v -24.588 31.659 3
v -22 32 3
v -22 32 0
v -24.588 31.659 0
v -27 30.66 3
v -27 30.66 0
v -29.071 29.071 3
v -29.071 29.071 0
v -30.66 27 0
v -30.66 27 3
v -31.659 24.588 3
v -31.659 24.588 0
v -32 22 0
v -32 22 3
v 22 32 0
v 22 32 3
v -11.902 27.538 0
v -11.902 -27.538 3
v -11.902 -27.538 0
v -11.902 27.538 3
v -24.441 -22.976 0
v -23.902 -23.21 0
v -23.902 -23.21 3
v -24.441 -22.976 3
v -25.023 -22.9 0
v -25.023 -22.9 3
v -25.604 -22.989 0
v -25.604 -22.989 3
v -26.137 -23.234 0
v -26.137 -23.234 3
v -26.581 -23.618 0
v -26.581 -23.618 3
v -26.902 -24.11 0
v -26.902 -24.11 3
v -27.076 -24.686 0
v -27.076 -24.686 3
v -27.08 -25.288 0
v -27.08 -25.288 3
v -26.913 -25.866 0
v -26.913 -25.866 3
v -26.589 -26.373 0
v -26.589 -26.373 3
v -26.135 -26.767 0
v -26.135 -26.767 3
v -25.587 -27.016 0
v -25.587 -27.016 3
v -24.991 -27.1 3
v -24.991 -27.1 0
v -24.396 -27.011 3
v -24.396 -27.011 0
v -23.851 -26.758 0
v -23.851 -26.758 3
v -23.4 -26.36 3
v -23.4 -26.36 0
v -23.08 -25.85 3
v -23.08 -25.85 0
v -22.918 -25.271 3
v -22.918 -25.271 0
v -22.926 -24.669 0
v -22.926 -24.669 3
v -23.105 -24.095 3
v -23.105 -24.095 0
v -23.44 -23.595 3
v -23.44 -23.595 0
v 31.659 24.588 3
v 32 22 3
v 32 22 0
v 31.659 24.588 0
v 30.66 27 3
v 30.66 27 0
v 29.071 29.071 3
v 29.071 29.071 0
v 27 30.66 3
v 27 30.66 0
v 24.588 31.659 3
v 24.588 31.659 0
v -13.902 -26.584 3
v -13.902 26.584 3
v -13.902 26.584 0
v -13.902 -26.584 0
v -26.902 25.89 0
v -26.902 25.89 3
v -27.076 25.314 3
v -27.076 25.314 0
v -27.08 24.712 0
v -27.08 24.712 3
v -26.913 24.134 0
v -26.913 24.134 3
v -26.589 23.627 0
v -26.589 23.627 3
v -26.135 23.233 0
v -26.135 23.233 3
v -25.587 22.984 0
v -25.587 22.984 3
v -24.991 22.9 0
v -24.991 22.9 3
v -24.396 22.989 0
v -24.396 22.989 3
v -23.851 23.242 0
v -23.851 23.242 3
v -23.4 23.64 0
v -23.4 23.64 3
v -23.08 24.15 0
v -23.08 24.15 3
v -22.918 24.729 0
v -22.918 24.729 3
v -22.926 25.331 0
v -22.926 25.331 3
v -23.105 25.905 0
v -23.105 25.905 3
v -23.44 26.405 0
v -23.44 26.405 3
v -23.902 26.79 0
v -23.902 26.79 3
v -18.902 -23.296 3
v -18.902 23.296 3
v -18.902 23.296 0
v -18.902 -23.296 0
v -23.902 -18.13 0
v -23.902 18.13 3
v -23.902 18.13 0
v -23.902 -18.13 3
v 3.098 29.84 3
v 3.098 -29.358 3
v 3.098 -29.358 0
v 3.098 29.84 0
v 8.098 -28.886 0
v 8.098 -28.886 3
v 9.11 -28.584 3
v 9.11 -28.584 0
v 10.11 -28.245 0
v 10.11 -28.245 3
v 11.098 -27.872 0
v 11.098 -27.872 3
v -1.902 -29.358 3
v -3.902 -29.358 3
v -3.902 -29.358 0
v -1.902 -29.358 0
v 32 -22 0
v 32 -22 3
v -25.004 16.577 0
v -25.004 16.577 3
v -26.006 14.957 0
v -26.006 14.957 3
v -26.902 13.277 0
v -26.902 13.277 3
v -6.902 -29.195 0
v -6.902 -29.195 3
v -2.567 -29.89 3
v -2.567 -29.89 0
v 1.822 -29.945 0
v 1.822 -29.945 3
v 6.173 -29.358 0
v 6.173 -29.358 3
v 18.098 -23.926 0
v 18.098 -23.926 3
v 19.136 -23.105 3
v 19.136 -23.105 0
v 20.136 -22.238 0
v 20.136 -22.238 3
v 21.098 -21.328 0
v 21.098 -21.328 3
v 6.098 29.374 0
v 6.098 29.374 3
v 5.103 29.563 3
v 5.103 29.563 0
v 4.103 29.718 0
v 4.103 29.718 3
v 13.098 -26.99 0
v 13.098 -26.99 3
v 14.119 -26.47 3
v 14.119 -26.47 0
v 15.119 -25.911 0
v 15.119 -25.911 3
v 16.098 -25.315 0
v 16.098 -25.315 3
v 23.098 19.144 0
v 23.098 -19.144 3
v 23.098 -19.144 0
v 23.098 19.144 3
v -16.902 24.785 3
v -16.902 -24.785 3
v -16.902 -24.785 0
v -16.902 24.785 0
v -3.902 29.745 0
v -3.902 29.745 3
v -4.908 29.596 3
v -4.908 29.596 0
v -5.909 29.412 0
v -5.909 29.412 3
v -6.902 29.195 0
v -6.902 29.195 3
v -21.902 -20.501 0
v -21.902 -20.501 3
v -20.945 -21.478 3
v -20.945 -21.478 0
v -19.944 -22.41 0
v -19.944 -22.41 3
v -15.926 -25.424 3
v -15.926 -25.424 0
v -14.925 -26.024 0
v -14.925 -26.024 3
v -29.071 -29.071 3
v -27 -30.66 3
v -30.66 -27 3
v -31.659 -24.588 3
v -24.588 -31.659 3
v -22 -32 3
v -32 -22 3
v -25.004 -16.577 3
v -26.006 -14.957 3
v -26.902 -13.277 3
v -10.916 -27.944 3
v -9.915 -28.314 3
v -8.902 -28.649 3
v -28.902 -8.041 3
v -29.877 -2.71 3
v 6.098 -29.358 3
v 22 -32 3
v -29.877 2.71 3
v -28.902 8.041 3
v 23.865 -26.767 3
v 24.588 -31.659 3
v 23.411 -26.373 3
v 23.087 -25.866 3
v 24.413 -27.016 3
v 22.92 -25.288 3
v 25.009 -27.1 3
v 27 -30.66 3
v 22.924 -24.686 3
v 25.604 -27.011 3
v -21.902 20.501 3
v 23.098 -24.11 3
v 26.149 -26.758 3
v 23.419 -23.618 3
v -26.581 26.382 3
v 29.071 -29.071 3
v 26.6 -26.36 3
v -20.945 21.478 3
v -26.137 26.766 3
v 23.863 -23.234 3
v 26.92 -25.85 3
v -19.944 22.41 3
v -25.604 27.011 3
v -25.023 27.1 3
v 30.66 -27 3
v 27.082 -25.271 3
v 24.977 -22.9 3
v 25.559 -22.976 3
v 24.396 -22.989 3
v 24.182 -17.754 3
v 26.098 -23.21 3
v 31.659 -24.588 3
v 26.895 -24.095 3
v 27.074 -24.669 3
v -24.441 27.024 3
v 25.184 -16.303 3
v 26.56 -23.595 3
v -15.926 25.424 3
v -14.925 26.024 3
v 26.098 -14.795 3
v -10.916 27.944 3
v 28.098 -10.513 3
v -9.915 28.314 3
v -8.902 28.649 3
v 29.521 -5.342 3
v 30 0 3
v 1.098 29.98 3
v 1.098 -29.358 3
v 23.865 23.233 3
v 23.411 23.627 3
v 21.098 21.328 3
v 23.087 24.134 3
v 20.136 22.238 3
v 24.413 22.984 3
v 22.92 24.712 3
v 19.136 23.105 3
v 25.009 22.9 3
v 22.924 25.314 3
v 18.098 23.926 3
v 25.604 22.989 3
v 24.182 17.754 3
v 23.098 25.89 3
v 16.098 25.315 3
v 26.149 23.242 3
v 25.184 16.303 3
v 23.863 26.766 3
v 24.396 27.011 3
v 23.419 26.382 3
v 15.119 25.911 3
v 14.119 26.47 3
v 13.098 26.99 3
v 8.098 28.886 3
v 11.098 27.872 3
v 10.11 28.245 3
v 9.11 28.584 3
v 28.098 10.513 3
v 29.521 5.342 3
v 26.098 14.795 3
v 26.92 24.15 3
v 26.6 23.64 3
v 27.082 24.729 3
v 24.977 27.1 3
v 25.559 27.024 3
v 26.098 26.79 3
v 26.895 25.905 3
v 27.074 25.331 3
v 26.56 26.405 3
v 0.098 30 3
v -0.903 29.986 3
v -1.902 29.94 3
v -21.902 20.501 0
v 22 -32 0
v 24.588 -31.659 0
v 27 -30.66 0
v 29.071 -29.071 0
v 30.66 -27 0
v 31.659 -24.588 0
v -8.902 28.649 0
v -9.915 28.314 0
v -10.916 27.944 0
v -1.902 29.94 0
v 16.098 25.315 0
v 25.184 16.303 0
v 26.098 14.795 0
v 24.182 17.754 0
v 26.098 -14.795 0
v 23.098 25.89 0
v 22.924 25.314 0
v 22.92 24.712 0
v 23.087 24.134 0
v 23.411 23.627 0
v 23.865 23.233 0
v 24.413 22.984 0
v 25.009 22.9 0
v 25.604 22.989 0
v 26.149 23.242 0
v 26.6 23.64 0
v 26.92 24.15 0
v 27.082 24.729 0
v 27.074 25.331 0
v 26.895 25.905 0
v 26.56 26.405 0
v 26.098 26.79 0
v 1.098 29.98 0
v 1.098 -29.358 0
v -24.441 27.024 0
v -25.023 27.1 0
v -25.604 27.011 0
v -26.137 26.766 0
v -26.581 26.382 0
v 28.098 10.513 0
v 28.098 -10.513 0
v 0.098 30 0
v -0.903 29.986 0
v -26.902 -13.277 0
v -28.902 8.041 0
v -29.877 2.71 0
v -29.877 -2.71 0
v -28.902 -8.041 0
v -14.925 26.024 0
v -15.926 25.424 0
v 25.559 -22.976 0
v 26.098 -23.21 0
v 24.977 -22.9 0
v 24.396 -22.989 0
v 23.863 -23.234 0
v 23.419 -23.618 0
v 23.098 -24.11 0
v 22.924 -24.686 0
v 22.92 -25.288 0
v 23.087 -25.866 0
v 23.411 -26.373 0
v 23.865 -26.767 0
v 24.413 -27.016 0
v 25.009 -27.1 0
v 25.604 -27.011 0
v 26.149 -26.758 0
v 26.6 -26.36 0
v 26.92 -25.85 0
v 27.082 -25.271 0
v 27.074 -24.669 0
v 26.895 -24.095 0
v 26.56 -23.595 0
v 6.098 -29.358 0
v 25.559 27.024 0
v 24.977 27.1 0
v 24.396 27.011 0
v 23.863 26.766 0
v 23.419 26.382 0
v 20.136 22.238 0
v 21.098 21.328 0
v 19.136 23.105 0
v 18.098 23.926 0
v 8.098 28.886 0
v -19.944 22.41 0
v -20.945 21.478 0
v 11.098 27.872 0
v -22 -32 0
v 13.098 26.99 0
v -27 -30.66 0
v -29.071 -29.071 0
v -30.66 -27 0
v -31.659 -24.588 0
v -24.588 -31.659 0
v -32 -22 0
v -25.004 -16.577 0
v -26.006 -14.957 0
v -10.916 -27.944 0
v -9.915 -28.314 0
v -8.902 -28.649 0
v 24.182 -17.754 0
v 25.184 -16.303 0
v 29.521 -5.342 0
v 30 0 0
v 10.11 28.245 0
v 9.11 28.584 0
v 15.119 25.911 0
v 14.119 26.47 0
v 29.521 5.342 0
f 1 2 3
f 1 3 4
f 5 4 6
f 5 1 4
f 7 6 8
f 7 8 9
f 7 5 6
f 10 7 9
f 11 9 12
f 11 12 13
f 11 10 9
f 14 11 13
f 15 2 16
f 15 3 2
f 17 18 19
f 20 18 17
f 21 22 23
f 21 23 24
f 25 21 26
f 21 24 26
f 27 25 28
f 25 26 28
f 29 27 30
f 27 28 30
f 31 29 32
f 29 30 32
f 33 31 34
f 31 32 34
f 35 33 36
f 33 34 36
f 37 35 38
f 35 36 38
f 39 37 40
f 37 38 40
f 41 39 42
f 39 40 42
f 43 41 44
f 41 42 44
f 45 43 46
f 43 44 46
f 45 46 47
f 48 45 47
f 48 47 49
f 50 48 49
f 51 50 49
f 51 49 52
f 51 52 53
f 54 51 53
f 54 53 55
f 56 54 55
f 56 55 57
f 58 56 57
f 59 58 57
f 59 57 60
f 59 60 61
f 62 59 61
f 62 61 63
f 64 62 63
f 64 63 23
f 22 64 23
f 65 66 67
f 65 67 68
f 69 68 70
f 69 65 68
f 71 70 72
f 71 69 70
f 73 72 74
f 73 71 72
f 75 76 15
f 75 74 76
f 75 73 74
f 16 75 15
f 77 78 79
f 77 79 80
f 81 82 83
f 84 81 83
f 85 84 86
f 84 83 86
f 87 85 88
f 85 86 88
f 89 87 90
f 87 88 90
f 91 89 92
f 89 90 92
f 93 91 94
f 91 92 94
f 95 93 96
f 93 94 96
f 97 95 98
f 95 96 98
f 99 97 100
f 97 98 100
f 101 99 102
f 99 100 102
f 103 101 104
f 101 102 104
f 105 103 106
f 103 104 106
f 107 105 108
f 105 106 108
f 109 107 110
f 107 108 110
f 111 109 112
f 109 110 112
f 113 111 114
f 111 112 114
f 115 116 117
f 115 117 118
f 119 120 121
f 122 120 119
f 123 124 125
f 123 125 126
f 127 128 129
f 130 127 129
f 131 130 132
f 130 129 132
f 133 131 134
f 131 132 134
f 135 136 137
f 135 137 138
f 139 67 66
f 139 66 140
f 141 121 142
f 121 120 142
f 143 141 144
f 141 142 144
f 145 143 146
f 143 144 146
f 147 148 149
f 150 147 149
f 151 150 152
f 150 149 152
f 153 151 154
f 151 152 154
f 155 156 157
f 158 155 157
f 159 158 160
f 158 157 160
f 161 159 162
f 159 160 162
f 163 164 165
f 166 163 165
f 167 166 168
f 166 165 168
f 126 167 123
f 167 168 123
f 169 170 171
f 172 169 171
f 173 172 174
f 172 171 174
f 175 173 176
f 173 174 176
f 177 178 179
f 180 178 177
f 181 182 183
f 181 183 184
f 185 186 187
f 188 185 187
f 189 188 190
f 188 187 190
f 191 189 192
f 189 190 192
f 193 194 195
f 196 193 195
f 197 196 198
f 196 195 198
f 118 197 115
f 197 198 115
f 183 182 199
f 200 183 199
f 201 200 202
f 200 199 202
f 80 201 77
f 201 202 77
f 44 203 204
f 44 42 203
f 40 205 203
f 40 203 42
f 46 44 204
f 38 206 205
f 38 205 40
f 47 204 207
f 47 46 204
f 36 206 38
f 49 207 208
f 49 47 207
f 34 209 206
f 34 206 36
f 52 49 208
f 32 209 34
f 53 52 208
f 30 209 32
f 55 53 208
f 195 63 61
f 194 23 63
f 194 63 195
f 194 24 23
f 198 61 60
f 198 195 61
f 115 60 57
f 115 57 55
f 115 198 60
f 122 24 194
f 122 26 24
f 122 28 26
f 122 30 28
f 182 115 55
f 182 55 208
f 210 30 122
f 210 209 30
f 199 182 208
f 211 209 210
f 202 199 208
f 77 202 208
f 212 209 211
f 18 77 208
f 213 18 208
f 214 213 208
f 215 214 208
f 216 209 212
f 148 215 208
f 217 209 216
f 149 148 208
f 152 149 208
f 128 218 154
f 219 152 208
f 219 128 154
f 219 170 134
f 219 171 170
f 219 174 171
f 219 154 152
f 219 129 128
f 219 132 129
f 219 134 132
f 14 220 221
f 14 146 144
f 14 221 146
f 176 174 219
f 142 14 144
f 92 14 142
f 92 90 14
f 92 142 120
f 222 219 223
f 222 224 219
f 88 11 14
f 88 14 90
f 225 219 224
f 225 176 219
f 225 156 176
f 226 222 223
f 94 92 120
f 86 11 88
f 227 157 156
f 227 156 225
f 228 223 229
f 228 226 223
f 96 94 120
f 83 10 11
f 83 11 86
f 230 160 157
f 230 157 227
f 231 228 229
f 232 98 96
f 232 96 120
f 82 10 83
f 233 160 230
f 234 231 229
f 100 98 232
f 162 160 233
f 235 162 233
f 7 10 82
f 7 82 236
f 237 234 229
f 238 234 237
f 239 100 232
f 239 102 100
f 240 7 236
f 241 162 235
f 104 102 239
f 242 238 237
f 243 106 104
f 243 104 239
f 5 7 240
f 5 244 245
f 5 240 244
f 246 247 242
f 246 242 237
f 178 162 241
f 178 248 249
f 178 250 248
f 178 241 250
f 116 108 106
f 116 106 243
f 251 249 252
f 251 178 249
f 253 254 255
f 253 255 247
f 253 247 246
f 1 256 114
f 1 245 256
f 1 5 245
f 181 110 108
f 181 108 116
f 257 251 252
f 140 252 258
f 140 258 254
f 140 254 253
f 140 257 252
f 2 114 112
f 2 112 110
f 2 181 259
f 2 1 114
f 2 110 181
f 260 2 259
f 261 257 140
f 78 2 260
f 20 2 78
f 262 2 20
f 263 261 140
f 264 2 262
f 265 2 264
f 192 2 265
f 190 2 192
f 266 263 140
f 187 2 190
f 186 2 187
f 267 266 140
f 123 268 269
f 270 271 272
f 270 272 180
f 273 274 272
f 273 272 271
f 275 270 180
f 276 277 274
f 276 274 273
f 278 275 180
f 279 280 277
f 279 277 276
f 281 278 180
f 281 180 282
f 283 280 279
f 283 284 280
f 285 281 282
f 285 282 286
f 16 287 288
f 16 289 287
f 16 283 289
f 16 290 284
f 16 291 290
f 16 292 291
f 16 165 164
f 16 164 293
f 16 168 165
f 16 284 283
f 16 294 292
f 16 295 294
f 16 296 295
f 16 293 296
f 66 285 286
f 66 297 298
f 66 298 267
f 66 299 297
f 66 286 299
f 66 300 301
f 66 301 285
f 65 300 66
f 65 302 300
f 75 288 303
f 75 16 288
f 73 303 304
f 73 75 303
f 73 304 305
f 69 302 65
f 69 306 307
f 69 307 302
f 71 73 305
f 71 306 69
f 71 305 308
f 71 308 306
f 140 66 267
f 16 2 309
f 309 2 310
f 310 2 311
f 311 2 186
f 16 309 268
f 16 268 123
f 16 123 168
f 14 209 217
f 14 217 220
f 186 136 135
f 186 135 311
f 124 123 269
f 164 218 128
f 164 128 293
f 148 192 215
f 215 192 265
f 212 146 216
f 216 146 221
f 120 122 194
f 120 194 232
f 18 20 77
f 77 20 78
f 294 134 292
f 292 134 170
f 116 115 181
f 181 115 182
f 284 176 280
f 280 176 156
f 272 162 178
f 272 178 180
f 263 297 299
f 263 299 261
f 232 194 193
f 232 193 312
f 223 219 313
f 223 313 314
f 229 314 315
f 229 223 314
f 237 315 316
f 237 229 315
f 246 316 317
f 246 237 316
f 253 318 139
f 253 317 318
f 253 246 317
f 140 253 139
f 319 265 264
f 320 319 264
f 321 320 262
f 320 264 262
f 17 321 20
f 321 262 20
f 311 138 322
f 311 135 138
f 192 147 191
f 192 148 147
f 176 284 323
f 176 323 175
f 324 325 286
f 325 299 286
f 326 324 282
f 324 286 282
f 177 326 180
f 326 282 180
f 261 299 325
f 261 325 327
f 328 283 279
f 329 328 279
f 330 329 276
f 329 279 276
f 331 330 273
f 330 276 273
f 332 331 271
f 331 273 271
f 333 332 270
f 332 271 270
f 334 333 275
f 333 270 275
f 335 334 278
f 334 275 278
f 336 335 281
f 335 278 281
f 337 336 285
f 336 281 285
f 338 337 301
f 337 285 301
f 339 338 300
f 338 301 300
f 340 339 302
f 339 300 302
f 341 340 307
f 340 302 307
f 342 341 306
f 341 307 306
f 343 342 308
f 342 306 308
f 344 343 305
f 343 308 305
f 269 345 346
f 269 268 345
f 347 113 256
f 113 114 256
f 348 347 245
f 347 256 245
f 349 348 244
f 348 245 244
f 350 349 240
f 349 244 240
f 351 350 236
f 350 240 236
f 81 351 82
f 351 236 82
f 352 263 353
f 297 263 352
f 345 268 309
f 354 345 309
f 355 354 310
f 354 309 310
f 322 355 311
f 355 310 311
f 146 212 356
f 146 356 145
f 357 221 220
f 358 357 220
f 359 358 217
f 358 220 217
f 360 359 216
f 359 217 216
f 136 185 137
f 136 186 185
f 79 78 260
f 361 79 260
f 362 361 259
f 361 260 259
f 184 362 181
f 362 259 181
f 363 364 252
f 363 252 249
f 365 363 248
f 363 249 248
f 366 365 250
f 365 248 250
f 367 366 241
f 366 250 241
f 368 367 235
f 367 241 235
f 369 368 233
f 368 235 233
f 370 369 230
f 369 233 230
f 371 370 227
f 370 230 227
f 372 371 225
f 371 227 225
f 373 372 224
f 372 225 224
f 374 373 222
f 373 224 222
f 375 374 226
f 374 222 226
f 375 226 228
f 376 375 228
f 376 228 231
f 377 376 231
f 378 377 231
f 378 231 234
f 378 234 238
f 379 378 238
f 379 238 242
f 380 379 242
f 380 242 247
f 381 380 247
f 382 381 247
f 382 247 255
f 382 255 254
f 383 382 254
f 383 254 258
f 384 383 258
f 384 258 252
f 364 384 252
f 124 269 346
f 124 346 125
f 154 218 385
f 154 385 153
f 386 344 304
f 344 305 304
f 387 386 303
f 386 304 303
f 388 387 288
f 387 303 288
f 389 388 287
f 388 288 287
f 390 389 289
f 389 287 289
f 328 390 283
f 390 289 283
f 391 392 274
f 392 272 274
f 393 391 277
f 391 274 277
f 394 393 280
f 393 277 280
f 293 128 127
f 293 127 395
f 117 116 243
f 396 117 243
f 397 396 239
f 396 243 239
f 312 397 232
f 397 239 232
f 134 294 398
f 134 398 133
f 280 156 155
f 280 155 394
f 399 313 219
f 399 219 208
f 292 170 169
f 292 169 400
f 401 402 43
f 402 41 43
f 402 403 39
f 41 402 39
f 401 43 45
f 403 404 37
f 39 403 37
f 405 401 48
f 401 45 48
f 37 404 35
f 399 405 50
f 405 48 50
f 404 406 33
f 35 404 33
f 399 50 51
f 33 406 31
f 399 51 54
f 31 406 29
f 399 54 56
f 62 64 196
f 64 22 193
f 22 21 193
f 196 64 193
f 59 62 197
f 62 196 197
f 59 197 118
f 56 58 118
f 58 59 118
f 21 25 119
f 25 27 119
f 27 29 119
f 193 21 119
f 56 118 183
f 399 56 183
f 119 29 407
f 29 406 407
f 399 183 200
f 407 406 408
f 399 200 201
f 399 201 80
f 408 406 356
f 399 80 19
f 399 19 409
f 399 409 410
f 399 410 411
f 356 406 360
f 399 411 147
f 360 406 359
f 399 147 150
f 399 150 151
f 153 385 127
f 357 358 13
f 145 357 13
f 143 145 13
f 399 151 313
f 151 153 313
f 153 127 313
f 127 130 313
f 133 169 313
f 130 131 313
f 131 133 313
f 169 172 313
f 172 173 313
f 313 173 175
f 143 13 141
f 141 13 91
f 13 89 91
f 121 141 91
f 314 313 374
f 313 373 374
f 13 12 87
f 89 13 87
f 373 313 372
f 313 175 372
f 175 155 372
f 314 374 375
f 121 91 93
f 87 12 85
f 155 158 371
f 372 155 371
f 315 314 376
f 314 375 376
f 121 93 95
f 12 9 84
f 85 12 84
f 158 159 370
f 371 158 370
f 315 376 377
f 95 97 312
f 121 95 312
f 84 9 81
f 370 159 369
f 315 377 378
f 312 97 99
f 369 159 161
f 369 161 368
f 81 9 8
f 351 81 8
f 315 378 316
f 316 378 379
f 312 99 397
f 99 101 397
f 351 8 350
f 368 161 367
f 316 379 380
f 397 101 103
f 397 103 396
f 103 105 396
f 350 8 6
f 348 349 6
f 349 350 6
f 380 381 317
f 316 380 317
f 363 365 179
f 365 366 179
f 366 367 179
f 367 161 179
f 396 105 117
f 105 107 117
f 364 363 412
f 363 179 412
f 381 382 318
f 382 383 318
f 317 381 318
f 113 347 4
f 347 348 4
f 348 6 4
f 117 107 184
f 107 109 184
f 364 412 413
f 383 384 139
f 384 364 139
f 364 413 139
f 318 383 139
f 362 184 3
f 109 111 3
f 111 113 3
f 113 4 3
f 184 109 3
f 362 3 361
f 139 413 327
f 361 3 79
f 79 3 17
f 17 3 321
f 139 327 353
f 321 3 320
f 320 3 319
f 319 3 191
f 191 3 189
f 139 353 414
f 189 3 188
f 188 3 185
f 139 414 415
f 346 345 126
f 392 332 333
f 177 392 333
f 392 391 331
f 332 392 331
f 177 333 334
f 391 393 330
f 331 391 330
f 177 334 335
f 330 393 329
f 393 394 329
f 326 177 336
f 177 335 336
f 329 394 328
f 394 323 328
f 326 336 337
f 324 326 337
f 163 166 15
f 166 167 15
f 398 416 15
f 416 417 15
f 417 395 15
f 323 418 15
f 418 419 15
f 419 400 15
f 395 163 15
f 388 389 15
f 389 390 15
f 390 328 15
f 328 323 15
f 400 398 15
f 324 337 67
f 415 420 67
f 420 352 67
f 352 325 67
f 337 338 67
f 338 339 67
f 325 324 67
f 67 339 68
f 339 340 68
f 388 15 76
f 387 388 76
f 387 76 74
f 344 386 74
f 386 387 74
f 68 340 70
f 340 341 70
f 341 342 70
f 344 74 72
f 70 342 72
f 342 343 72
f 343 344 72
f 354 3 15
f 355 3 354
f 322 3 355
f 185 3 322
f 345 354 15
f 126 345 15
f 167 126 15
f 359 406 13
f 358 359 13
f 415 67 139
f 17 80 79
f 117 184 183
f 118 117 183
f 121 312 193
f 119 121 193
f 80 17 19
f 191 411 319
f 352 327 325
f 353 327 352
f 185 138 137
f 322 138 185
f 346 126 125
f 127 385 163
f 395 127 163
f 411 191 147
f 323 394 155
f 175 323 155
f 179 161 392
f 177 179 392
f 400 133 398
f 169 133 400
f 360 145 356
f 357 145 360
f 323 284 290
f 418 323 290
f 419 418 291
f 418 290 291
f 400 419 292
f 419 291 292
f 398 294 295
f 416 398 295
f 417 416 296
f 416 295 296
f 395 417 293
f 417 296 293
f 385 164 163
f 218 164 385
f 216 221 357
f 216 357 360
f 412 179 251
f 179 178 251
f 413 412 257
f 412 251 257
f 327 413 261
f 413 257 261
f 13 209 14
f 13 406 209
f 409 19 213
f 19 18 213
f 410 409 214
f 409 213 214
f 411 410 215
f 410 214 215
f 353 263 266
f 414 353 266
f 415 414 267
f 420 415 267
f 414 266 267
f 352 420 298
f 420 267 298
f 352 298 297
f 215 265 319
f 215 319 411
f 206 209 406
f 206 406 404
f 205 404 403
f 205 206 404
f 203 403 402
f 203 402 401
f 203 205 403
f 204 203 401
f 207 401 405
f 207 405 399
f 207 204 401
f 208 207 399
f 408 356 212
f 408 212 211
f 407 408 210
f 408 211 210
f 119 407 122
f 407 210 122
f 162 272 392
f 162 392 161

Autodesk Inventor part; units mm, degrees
ref_plane "YZ Plane" through (0, 0, 0) normal (1, 0, 0) x (0, 1, 0)
ref_plane "XZ Plane" through (0, 0, 0) normal (0, 1, 0) x (-1, 0, 0)
ref_plane "XY Plane" through (0, 0, 0) normal (0, 0, 1) x (1, 0, 0)
sketch "Skizze1" plane through (0, 0, 0) normal (0, 0, 1) x (1, 0, 0)
  line L0 (-41.5, 35.6804) -> (-41.5, -22.9) construction
  line L1 (-41.5, -22.9) -> (-43.9777, -22.9) construction
  line L2 (-43.9777, -22.9) -> (-43.9777, 35.6804) construction
  line L3 (-43.9777, 35.6804) -> (-41.5, 35.6804) construction
  line L4 (-47.5, 35.6804) -> (-47.5, -0.041) construction
  line L5 (-47.5, -0.041) -> (-49.9777, -0.041) construction
  line L6 (-49.9777, -0.041) -> (-49.9777, 35.6804) construction
  line L7 (-49.9777, 35.6804) -> (-47.5, 35.6804) construction
  circle A0 centre (-47.5, -3) radius 1.35 construction
  line L8 (36.5, 27.1) -> (36.5, -35.7623) construction
  line L9 (36.5, -35.7623) -> (34.0223, -35.7623) construction
  line L10 (34.0223, -35.7623) -> (34.0223, 27.1) construction
  line L11 (34.0223, 27.1) -> (36.5, 27.1) construction
  line L12 (30.5, -25.9706) -> (30.5, -35.7623) construction
  line L13 (30.5, -35.7623) -> (28.0223, -35.7623) construction
  line L14 (28.0223, -35.7623) -> (28.0223, -25.9706) construction
  line L15 (28.0223, -25.9706) -> (30.5, -25.9706) construction
  line L16 (18.5, -28.5) -> (18.5, -35.7623) construction
  line L17 (18.5, -35.7623) -> (16.0223, -35.7623) construction
  line L18 (16.0223, -35.7623) -> (16.0223, -28.5) construction
  line L19 (16.0223, -28.5) -> (18.5, -28.5) construction
  line L20 (-29.5, -16.7561) -> (-29.5, -22.9) construction
  line L21 (-29.5, -22.9) -> (-31.9777, -22.9) construction
  line L22 (-31.9777, -22.9) -> (-31.9777, -16.7561) construction
  line L23 (-31.9777, -16.7561) -> (-29.5, -16.7561) construction
  line L24 (-25.9777, 30.1243) -> (-25.9777, 35.6804) construction
  line L25 (-25.9777, 35.6804) -> (-23.5, 35.6804) construction
  line L26 (-23.5, 35.6804) -> (-23.5, 30.1243) construction
  line L27 (-23.5, 30.1243) -> (-25.9777, 30.1243) construction
  line L28 (16.0223, 31.6466) -> (16.0223, 35.6804) construction
  line L29 (16.0223, 35.6804) -> (18.5, 35.6804) construction
  line L30 (18.5, 35.6804) -> (18.5, 31.6466) construction
  line L31 (18.5, 31.6466) -> (16.0223, 31.6466) construction
  line L32 (-5.5, -32.1312) -> (-5.5, -35.7623) construction
  line L33 (-5.5, -35.7623) -> (-7.9777, -35.7623) construction
  line L34 (-7.9777, -35.7623) -> (-7.9777, -32.1312) construction
  line L35 (-7.9777, -32.1312) -> (-5.5, -32.1312) construction
  line L36 (10.0223, 32.8979) -> (10.0223, 35.6804) construction
  line L37 (10.0223, 35.6804) -> (12.5, 35.6804) construction
  line L38 (12.5, 35.6804) -> (12.5, 32.8979) construction
  line L39 (12.5, 32.8979) -> (10.0223, 32.8979) construction
  line L40 (-7.9777, 33.0955) -> (-7.9777, 35.6804) construction
  line L41 (-7.9777, 35.6804) -> (-5.5, 35.6804) construction
  line L42 (-5.5, 35.6804) -> (-5.5, 33.0955) construction
  line L43 (-5.5, 33.0955) -> (-7.9777, 33.0955) construction
  line L44 (0.5, -33.9467) -> (0.5, -35.7623) construction
  line L45 (0.5, -35.7623) -> (-1.9777, -35.7623) construction
  line L46 (-1.9777, -35.7623) -> (-1.9777, -33.9467) construction
  line L47 (-1.9777, -33.9467) -> (0.5, -33.9467) construction
  line L48 (-1.9777, 34.0902) -> (-1.9777, 35.6804) construction
  line L49 (-1.9777, 35.6804) -> (0.5, 35.6804) construction
  line L50 (0.5, 35.6804) -> (0.5, 34.0902) construction
  line L51 (0.5, 34.0902) -> (-1.9777, 34.0902) construction
  line L52 (6.5, -33.9467) -> (6.5, -35.7623) construction
  line L53 (6.5, -35.7623) -> (4.0223, -35.7623) construction
  line L54 (4.0223, -35.7623) -> (4.0223, -33.9467) construction
  line L55 (4.0223, -33.9467) -> (6.5, -33.9467) construction
  line L56 (4.0223, 32.8979) -> (4.0223, 35.6804) construction
  line L57 (4.0223, 35.6804) -> (6.5, 35.6804) construction
  line L58 (6.5, 35.6804) -> (6.5, 32.8979) construction
  line L59 (6.5, 32.8979) -> (4.0223, 32.8979) construction
  line L60 (-13.9777, 32.5) -> (-13.9777, 35.6804) construction
  line L61 (-13.9777, 35.6804) -> (-11.5, 35.6804) construction
  line L62 (-11.5, 35.6804) -> (-11.5, 32.5) construction
  line L63 (-11.5, 32.5) -> (-13.9777, 32.5) construction
  line L64 (12.5, -32.1312) -> (12.5, -35.7623) construction
  line L65 (12.5, -35.7623) -> (10.0223, -35.7623) construction
  line L66 (10.0223, -35.7623) -> (10.0223, -32.1312) construction
  line L67 (10.0223, -32.1312) -> (12.5, -32.1312) construction
  line L68 (-19.9777, 31.3064) -> (-19.9777, 35.6804) construction
  line L69 (-19.9777, 35.6804) -> (-17.5, 35.6804) construction
  line L70 (-17.5, 35.6804) -> (-17.5, 31.3064) construction
  line L71 (-17.5, 31.3064) -> (-19.9777, 31.3064) construction
  line L72 (22.0223, 30) -> (22.0223, 35.6804) construction
  line L73 (22.0223, 35.6804) -> (24.5, 35.6804) construction
  line L74 (24.5, 35.6804) -> (24.5, 30) construction
  line L75 (24.5, 30) -> (22.0223, 30) construction
  line L76 (-29.5, 27.1) -> (-29.5, 20.9081) construction
  line L77 (-29.5, 20.9081) -> (-31.9777, 20.9081) construction
  line L78 (-31.9777, 20.9081) -> (-31.9777, 27.1) construction
  line L79 (-31.9777, 27.1) -> (-29.5, 27.1) construction
  line L80 (24.5, -28.5) -> (24.5, -35.7623) construction
  line L81 (24.5, -35.7623) -> (22.0223, -35.7623) construction
  line L82 (22.0223, -35.7623) -> (22.0223, -28.5) construction
  line L83 (22.0223, -28.5) -> (24.5, -28.5) construction
  line L84 (-49.9777, -22.9) -> (-49.9777, -6.1402) construction
  line L85 (-49.9777, -6.1402) -> (-47.5, -6.1402) construction
  line L86 (-47.5, -6.1402) -> (-47.5, -22.9) construction
  line L87 (-47.5, -22.9) -> (-49.9777, -22.9) construction
  line L88 (46.0223, -27.1) -> (46.0223, 35.6804) construction
  line L89 (46.0223, 35.6804) -> (48.5, 35.6804) construction
  line L90 (48.5, 35.6804) -> (48.5, -27.1) construction
  line L91 (48.5, -27.1) -> (46.0223, -27.1) construction
  line L92 (40.0223, 35.6804) -> (42.5, 35.6804) construction
  line L93 (42.5, 35.6804) -> (42.5, -35.7623) construction
  line L94 (42.5, -35.7623) -> (40.0223, -35.7623) construction
  line L95 (40.0223, -35.7623) -> (40.0223, 35.6804) construction
  circle A1 centre (25, 25) radius 2.1 construction
  circle A2 centre (-25, 25) radius 2.1 construction
  circle A3 centre (-25, -25) radius 2.1 construction
  circle A4 centre (25, -25) radius 2.1 construction
  circle A5 centre (32, 32.5) radius 1.35 construction
  circle A6 centre (-30, 32.5) radius 1.35 construction
  circle A7 centre (47.5, -32.5) radius 1.35 construction
  line L96 (-35.5, 35.6804) -> (-35.5, -22.9) construction
  line L97 (-35.5, -22.9) -> (-37.9777, -22.9) construction
  line L98 (-37.9777, -22.9) -> (-37.9777, 35.6804) construction
  line L99 (-37.9777, 35.6804) -> (-35.5, 35.6804) construction
  line L100 (-52.5, -24.5) -> (-52.5, 37.5) construction
  line L101 (-52.5, -24.5) -> (-32.8176, -24.5) construction
  arc A8 (-32.8176, -24.5) -> (-11.4624, -29.9989) centre (-10.5668, 17.6958) ccw construction
  arc A9 (-9.5, -31.9985) -> (-11.4624, -29.9989) centre (-11.5, -31.9985) ccw construction
  line L102 (-9.5, -31.9985) -> (-9.5, -37.5) construction
  line L103 (52.5, -37.5) -> (-9.5, -37.5) construction
  line L104 (52.5, 37.5) -> (52.5, -37.5) construction
  line L105 (-52.5, 37.5) -> (52.5, 37.5) construction
  circle A10 centre (0, 0) radius 32 construction
  line L106 (-32, 32) -> (32, 32)
  line L107 (32, 32) -> (32, -32)
  line L108 (32, -32) -> (-32, -32)
  line L109 (-32, -32) -> (-32, 32)
  line L110 (-32, 32) -> (32, -32) construction
  line L111 (32, 32) -> (-32, -32) construction
extrude "Extrusion1" add sketch "Skizze1" along normal blind 3
sketch "Skizze2" plane through (0, 0, 3) normal (0, 0, 1) x (1, 0, 0)
  circle A0 centre (0, 0) radius 30 projected
  circle A1 centre (25, 25) radius 2.1 projected
  circle A2 centre (-25, 25) radius 2.1 projected
  circle A3 centre (-25, -25) radius 2.1 projected
  circle A4 centre (25, -25) radius 2.1 projected
extrude "Extrusion2" cut sketch "Skizze2" against normal through all
sketch "Skizze3" plane through (0, 0, 3) normal (0, 0, 1) x (1, 0, 0)
  line L0 (28.0978, 30) -> (26.0978, 30)
  line L1 (26.0978, 30) -> (26.0978, -29.358)
  line L2 (26.0978, -29.358) -> (28.0978, -29.358)
  line L3 (28.0978, -29.358) -> (28.0978, 30)
  line L4 (32, 32) -> (-32, 32) construction
  line L5 (23.0978, 30) -> (21.0978, 30)
  line L6 (21.0978, 30) -> (21.0978, -29.358)
  line L7 (21.0978, -29.358) -> (23.0978, -29.358)
  line L8 (23.0978, -29.358) -> (23.0978, 30)
  line L9 (18.0978, 30) -> (16.0978, 30)
  line L10 (16.0978, 30) -> (16.0978, -29.358)
  line L11 (16.0978, -29.358) -> (18.0978, -29.358)
  line L12 (18.0978, -29.358) -> (18.0978, 30)
  line L13 (13.0978, 30) -> (11.0978, 30)
  line L14 (11.0978, 30) -> (11.0978, -29.358)
  line L15 (11.0978, -29.358) -> (13.0978, -29.358)
  line L16 (13.0978, -29.358) -> (13.0978, 30)
  line L17 (8.0978, 30) -> (6.0978, 30)
  line L18 (6.0978, 30) -> (6.0978, -29.358)
  line L19 (6.0978, -29.358) -> (8.0978, -29.358)
  line L20 (8.0978, -29.358) -> (8.0978, 30)
  line L21 (3.0978, 30) -> (1.0978, 30)
  line L22 (1.0978, 30) -> (1.0978, -29.358)
  line L23 (1.0978, -29.358) -> (3.0978, -29.358)
  line L24 (3.0978, -29.358) -> (3.0978, 30)
  line L25 (-1.9022, 30) -> (-3.9022, 30)
  line L26 (-3.9022, 30) -> (-3.9022, -29.358)
  line L27 (-3.9022, -29.358) -> (-1.9022, -29.358)
  line L28 (-1.9022, -29.358) -> (-1.9022, 30)
  line L29 (-6.9022, 30) -> (-8.9022, 30)
  line L30 (-8.9022, 30) -> (-8.9022, -29.358)
  line L31 (-8.9022, -29.358) -> (-6.9022, -29.358)
  line L32 (-6.9022, -29.358) -> (-6.9022, 30)
  line L33 (-11.9022, 30) -> (-13.9022, 30)
  line L34 (-13.9022, 30) -> (-13.9022, -29.358)
  line L35 (-13.9022, -29.358) -> (-11.9022, -29.358)
  line L36 (-11.9022, -29.358) -> (-11.9022, 30)
  line L37 (-16.9022, 30) -> (-18.9022, 30)
  line L38 (-18.9022, 30) -> (-18.9022, -29.358)
  line L39 (-18.9022, -29.358) -> (-16.9022, -29.358)
  line L40 (-16.9022, -29.358) -> (-16.9022, 30)
  line L41 (-21.9022, 30) -> (-23.9022, 30)
  line L42 (-23.9022, 30) -> (-23.9022, -29.358)
  line L43 (-23.9022, -29.358) -> (-21.9022, -29.358)
  line L44 (-21.9022, -29.358) -> (-21.9022, 30)
  line L45 (-26.9022, 30) -> (-28.9022, 30)
  line L46 (-28.9022, 30) -> (-28.9022, -29.358)
  line L47 (-28.9022, -29.358) -> (-26.9022, -29.358)
  line L48 (-26.9022, -29.358) -> (-26.9022, 30)
  point P0 (0, 0)
  dimension "d4" = 2
  dimension "d7" = 5
extrude "Extrusion3" add sketch "Skizze3" against normal blind 3
sketch "Skizze4" plane through (0, 0, 3) normal (0, 0, 1) x (1, 0, 0)
  arc A0 (-23.9022, 26.7902) -> (-26.9022, 25.8897) centre (-25, 25) ccw projected
  arc A1 (26.0978, 26.7902) -> (23.0978, 25.8897) centre (25, 25) ccw projected
  arc A2 (26.0978, -23.2098) -> (23.0978, -24.1103) centre (25, -25) ccw projected
  arc A3 (-23.9022, -23.2098) -> (-26.9022, -24.1103) centre (-25, -25) ccw projected
  circle A4 centre (-25, 25) radius 2.1
  circle A5 centre (25, 25) radius 2.1
  circle A6 centre (25, -25) radius 2.1
  circle A7 centre (-25, -25) radius 2.1
  point P0 (0, 0)
extrude "Extrusion4" cut sketch "Skizze4" against normal blind 3
fillet "Rundung1" radius 10 4 edges at (32, 32, 1.5) (32, -32, 1.5) (-32, 32, 1.5) (-32, -32, 1.5)
properties part number "Fan_blend"
